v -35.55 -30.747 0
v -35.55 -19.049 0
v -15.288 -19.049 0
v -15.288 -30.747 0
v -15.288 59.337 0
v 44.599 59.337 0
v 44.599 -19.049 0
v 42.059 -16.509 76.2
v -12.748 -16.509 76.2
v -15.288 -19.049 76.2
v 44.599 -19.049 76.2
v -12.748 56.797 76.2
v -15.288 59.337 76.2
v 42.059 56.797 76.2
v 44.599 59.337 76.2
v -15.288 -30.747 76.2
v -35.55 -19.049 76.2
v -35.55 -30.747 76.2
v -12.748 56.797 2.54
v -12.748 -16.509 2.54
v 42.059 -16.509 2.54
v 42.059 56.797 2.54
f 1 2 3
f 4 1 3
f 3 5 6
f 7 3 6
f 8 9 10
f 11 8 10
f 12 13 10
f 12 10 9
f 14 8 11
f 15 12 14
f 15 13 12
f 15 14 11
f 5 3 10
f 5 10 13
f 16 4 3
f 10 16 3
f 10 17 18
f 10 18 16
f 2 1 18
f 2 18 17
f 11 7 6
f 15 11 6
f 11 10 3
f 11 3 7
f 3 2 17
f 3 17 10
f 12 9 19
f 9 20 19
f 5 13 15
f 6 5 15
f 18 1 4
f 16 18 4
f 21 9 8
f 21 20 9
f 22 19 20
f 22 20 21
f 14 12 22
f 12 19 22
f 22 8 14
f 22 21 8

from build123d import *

# Parameters (mm, degrees)
F0_W     = 20.2620141208
F0_H     = 11.6982832551
F1_DEPTH = 76.2
F0_W_2   = 59.8873868585
F0_H_2   = 78.3857703209
F2_T     = -2.54


with BuildPart() as f1:
    # F0 (on Top) → F1 (new body)
    with BuildSketch(Plane.XY):
        with Locations((-25.4190247506, -24.8979590833)):
            Rectangle(F0_W, F0_H)
    extrude(amount=F1_DEPTH)


with BuildPart() as f1b:
    # F0 (on Top) → F1, piece 2 (new body)
    with BuildSketch(Plane.XY):
        with Locations((14.655675739, 20.1440677047)):
            Rectangle(F0_W_2, F0_H_2)
    extrude(amount=F1_DEPTH)

    # F2
    f2_openings = [f1b.faces().sort_by_distance(p)[0] for p in [
        (14.655676, 20.144068, 76.2),
    ]]
    offset(amount=F2_T, openings=f2_openings)


solid = Compound([f1.part, f1b.part])
